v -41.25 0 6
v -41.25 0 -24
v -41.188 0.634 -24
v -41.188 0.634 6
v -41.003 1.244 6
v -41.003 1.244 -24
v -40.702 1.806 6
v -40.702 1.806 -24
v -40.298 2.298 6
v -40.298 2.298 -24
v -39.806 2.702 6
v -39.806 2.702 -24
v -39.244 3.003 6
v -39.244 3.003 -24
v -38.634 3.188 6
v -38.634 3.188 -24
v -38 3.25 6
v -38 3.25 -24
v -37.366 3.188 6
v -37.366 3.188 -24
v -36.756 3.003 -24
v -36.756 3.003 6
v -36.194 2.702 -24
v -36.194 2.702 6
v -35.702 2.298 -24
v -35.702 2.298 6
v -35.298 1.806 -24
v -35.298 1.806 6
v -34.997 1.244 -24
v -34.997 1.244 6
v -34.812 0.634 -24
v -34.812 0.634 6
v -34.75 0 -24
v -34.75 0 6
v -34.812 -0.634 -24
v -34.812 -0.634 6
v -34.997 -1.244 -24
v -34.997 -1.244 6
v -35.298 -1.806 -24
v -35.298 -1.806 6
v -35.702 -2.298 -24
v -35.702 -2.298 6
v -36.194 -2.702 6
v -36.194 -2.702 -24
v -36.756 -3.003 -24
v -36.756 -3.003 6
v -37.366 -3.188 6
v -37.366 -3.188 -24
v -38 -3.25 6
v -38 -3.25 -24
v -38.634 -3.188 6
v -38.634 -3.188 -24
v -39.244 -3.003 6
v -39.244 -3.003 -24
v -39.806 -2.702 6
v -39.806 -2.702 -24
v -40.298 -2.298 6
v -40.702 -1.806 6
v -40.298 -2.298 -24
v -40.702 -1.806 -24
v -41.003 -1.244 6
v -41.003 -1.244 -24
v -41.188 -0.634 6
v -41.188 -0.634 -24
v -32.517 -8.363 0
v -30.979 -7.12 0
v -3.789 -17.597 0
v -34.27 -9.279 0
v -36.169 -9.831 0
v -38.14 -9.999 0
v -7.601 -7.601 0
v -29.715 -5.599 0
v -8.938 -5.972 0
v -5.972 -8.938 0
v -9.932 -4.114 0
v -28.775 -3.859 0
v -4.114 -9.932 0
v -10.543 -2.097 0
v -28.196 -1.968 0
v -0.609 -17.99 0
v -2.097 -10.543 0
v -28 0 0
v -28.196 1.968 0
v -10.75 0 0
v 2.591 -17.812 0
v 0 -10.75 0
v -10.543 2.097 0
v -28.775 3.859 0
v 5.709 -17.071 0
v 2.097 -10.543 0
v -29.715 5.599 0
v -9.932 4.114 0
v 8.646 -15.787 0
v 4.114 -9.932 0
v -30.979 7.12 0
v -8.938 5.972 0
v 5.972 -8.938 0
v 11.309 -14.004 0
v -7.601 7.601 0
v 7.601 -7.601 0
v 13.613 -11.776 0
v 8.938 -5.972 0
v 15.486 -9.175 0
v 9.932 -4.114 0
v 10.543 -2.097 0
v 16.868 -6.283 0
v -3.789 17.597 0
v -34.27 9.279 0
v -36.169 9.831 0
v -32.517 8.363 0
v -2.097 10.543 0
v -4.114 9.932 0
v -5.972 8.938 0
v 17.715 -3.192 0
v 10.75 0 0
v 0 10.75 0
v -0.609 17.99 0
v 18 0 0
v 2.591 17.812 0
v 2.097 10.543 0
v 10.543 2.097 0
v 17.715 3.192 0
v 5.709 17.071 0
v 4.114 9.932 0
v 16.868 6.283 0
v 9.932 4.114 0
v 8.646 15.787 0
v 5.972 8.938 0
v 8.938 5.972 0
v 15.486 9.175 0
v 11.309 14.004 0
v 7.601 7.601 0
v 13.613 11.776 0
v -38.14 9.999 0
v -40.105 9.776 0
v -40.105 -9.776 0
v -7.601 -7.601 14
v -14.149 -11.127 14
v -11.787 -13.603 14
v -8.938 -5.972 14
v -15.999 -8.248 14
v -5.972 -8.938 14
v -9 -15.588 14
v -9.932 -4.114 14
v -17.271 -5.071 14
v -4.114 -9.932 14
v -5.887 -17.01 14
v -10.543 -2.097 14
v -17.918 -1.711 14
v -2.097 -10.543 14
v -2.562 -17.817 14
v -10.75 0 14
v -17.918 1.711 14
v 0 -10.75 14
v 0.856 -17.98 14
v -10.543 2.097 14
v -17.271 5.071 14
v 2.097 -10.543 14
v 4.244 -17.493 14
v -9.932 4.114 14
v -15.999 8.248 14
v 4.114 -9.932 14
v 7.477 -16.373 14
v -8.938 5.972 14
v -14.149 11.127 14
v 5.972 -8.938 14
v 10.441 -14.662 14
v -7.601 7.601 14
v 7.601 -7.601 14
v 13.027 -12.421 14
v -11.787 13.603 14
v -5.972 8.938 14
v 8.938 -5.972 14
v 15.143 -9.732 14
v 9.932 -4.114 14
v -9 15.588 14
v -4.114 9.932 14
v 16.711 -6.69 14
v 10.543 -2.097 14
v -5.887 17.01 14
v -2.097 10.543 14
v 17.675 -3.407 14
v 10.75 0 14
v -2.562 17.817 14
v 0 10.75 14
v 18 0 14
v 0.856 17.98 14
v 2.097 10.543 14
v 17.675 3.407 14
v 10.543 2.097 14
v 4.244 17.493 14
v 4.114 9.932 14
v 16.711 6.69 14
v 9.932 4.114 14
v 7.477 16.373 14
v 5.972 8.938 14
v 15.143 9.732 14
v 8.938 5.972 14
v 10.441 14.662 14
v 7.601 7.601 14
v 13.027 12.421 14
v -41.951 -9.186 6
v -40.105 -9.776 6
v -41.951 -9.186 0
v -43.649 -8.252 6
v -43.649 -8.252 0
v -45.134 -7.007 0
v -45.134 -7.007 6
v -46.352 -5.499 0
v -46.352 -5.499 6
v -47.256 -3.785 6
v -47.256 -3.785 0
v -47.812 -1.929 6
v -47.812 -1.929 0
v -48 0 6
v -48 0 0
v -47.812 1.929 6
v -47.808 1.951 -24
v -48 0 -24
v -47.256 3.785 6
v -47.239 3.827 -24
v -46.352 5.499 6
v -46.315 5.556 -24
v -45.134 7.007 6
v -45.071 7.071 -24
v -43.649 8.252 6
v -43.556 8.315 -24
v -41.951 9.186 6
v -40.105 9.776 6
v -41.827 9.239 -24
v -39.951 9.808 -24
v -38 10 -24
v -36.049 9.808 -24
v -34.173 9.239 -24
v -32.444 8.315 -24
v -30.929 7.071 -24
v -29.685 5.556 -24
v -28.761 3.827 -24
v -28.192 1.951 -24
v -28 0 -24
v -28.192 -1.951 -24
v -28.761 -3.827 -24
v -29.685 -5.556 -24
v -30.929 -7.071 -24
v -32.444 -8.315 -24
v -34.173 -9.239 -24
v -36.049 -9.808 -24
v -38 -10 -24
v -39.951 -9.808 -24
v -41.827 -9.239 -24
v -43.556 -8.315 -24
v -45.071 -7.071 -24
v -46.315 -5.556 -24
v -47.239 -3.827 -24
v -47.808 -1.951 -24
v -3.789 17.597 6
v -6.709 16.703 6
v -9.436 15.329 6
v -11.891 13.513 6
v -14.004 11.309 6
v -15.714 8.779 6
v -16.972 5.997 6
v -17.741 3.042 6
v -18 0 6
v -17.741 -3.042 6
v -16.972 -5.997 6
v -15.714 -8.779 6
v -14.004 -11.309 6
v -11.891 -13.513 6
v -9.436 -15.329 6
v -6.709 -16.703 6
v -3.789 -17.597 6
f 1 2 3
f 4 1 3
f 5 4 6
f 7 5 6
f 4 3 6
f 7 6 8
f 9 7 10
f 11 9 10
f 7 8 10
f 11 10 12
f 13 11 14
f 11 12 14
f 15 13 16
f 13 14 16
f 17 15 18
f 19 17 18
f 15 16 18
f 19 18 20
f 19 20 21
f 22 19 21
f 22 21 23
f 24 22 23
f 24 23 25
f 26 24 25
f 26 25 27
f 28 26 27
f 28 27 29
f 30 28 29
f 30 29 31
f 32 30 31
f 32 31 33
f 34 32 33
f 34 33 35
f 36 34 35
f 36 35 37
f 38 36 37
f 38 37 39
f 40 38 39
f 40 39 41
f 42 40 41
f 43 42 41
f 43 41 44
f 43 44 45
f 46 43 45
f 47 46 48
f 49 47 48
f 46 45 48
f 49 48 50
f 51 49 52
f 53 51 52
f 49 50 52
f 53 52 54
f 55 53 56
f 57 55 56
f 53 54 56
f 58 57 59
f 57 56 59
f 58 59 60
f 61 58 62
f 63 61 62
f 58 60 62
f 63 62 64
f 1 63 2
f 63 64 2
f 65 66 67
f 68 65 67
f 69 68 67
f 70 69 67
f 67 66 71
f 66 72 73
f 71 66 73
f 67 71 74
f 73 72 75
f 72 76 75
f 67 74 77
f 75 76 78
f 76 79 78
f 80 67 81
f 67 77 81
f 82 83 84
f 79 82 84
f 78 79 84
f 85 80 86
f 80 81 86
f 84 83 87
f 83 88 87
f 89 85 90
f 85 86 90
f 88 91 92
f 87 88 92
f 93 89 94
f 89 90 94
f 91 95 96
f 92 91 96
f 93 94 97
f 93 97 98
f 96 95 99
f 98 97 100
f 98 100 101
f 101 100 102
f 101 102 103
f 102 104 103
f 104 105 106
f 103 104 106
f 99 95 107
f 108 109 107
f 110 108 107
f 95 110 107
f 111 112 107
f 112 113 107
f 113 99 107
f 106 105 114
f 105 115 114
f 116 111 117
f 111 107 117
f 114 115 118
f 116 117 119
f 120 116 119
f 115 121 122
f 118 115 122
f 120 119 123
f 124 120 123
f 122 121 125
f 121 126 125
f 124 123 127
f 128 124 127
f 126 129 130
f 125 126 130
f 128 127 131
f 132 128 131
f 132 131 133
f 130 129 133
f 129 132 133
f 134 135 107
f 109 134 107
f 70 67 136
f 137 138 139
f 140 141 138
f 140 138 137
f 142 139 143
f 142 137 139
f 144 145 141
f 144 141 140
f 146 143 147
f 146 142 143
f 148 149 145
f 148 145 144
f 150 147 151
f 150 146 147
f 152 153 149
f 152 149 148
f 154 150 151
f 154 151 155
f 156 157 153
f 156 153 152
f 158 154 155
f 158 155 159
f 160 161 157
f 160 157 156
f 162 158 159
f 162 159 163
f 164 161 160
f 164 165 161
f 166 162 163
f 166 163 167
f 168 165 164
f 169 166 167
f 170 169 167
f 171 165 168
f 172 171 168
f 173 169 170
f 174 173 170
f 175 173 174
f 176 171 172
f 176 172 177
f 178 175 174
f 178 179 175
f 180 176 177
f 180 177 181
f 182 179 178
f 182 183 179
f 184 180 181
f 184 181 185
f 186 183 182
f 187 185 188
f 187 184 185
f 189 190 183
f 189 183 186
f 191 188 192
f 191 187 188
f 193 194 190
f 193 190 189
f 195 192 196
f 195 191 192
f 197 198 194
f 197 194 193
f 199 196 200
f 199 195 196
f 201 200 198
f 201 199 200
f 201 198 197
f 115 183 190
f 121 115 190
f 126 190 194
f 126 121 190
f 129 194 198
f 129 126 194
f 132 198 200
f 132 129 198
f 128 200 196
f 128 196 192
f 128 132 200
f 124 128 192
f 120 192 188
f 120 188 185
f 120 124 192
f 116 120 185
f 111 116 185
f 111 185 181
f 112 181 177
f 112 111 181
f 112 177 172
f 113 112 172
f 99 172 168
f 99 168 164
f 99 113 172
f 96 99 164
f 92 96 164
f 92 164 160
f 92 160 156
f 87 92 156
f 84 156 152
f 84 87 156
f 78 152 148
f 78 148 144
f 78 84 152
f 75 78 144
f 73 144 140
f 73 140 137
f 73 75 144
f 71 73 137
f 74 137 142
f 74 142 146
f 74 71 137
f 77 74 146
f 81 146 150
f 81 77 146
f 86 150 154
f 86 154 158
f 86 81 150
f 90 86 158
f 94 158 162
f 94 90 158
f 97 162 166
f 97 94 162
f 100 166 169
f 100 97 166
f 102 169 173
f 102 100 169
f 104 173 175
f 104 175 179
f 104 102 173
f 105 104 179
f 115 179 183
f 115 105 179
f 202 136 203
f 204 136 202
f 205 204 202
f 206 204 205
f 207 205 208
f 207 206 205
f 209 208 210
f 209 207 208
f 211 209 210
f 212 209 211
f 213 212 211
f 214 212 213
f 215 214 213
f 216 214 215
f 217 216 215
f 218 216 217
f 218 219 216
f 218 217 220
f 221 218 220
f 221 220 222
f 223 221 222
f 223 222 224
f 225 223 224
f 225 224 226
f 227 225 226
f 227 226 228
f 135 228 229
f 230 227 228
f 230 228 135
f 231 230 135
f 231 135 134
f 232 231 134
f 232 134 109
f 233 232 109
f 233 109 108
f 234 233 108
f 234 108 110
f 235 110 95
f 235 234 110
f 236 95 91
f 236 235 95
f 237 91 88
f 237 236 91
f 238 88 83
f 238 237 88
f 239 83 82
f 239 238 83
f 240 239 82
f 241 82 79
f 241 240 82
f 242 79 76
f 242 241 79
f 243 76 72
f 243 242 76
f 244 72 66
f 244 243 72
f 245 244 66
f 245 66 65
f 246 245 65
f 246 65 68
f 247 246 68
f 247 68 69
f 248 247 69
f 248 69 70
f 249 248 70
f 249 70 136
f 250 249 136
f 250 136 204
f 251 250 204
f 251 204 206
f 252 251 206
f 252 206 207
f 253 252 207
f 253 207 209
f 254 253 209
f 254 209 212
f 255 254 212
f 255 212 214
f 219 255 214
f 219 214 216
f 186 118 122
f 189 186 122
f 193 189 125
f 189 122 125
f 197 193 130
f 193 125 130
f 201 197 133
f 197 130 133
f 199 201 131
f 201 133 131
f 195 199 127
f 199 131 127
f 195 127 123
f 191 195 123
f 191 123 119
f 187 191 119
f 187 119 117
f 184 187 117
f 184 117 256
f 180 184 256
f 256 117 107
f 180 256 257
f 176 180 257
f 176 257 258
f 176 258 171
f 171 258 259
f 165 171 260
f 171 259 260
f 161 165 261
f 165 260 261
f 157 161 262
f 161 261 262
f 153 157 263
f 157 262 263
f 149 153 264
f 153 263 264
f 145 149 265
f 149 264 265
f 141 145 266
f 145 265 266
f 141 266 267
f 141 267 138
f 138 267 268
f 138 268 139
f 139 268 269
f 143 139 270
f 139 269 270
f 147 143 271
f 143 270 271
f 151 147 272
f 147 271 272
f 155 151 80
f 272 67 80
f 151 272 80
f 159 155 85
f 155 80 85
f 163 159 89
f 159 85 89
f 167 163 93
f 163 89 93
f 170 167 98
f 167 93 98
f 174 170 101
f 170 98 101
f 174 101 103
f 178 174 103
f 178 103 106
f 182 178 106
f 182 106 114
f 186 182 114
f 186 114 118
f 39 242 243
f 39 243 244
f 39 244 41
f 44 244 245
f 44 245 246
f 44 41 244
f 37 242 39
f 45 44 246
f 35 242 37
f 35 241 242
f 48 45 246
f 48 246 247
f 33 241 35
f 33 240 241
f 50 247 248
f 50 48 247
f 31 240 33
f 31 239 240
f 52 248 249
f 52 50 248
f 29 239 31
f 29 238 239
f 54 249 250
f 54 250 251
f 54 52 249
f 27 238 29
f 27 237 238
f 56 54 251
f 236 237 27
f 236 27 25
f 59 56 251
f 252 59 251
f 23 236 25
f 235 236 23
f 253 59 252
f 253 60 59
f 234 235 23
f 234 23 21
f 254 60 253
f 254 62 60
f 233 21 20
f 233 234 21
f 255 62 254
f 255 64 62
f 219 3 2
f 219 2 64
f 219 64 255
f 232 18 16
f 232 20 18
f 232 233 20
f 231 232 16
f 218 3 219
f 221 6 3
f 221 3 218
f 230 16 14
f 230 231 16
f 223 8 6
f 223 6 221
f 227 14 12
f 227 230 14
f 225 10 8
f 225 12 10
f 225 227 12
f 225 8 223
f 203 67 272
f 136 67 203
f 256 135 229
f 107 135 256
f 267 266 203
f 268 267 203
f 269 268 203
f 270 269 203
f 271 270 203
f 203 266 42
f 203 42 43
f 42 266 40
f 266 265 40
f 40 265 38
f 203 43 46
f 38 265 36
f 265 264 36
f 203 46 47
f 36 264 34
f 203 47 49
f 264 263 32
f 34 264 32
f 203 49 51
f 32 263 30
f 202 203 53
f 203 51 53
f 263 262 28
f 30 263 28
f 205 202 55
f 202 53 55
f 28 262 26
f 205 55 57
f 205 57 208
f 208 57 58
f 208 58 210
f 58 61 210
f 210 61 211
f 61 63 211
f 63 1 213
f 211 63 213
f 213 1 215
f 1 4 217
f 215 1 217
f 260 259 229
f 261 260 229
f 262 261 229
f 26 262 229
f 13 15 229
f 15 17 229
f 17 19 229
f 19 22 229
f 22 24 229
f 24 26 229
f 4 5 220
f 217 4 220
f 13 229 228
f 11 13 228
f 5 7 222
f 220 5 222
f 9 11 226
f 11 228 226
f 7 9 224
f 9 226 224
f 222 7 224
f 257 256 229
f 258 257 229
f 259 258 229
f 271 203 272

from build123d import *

# Parameters (mm, degrees)
SKETCH1_R           = 18
SKETCH1_R_2         = 10.75
BOSS_EXTRUDE1_DEPTH = 14
SKETCH2_R           = 3.25
BOSS_EXTRUDE2_DEPTH = 6
BOSS_EXTRUDE3_START = 24
SKETCH3_R           = 10
SKETCH3_R_2         = 3.25
BOSS_EXTRUDE3_DEPTH = 24


with BuildPart() as part:
    # Sketch1 → Boss-Extrude1 (new body)
    with BuildSketch(Plane.XY):
        Circle(SKETCH1_R)
        Circle(SKETCH1_R_2, mode=Mode.SUBTRACT)
    extrude(amount=BOSS_EXTRUDE1_DEPTH)

    # Sketch2 → Boss-Extrude2 (add)
    with BuildSketch(Plane(origin=(0, 0, 0), x_dir=(-1, 0, 0), z_dir=(0, 0, -1))):
        with BuildLine():
            ThreePointArc((40.105263158, -9.775881906), (48, 0), (40.105263158, 9.775881906))
            Line((40.105263158, 9.775881906), (3.789473684, 17.59658743))
            ThreePointArc((3.789473684, 17.59658743), (14.003758894, 11.309055524), (18, 0))
            ThreePointArc((18, 0), (14.003758894, -11.309055524), (3.789473684, -17.59658743))
            Line((3.789473684, -17.59658743), (40.105263158, -9.775881906))
        make_face()
        with Locations((38, 0)):
            Circle(SKETCH2_R, mode=Mode.SUBTRACT)
    extrude(amount=-BOSS_EXTRUDE2_DEPTH)

    # Sketch3 → Boss-Extrude3 (add)
    with BuildSketch(Plane(origin=(0, 0, 0), x_dir=(-1, 0, 0), z_dir=(0, 0, -1)).offset(BOSS_EXTRUDE3_START)):
        with Locations((38, 0)):
            Circle(SKETCH3_R)
        with Locations((38, 0)):
            Circle(SKETCH3_R_2, mode=Mode.SUBTRACT)
    extrude(amount=-BOSS_EXTRUDE3_DEPTH)


solid = part.part
